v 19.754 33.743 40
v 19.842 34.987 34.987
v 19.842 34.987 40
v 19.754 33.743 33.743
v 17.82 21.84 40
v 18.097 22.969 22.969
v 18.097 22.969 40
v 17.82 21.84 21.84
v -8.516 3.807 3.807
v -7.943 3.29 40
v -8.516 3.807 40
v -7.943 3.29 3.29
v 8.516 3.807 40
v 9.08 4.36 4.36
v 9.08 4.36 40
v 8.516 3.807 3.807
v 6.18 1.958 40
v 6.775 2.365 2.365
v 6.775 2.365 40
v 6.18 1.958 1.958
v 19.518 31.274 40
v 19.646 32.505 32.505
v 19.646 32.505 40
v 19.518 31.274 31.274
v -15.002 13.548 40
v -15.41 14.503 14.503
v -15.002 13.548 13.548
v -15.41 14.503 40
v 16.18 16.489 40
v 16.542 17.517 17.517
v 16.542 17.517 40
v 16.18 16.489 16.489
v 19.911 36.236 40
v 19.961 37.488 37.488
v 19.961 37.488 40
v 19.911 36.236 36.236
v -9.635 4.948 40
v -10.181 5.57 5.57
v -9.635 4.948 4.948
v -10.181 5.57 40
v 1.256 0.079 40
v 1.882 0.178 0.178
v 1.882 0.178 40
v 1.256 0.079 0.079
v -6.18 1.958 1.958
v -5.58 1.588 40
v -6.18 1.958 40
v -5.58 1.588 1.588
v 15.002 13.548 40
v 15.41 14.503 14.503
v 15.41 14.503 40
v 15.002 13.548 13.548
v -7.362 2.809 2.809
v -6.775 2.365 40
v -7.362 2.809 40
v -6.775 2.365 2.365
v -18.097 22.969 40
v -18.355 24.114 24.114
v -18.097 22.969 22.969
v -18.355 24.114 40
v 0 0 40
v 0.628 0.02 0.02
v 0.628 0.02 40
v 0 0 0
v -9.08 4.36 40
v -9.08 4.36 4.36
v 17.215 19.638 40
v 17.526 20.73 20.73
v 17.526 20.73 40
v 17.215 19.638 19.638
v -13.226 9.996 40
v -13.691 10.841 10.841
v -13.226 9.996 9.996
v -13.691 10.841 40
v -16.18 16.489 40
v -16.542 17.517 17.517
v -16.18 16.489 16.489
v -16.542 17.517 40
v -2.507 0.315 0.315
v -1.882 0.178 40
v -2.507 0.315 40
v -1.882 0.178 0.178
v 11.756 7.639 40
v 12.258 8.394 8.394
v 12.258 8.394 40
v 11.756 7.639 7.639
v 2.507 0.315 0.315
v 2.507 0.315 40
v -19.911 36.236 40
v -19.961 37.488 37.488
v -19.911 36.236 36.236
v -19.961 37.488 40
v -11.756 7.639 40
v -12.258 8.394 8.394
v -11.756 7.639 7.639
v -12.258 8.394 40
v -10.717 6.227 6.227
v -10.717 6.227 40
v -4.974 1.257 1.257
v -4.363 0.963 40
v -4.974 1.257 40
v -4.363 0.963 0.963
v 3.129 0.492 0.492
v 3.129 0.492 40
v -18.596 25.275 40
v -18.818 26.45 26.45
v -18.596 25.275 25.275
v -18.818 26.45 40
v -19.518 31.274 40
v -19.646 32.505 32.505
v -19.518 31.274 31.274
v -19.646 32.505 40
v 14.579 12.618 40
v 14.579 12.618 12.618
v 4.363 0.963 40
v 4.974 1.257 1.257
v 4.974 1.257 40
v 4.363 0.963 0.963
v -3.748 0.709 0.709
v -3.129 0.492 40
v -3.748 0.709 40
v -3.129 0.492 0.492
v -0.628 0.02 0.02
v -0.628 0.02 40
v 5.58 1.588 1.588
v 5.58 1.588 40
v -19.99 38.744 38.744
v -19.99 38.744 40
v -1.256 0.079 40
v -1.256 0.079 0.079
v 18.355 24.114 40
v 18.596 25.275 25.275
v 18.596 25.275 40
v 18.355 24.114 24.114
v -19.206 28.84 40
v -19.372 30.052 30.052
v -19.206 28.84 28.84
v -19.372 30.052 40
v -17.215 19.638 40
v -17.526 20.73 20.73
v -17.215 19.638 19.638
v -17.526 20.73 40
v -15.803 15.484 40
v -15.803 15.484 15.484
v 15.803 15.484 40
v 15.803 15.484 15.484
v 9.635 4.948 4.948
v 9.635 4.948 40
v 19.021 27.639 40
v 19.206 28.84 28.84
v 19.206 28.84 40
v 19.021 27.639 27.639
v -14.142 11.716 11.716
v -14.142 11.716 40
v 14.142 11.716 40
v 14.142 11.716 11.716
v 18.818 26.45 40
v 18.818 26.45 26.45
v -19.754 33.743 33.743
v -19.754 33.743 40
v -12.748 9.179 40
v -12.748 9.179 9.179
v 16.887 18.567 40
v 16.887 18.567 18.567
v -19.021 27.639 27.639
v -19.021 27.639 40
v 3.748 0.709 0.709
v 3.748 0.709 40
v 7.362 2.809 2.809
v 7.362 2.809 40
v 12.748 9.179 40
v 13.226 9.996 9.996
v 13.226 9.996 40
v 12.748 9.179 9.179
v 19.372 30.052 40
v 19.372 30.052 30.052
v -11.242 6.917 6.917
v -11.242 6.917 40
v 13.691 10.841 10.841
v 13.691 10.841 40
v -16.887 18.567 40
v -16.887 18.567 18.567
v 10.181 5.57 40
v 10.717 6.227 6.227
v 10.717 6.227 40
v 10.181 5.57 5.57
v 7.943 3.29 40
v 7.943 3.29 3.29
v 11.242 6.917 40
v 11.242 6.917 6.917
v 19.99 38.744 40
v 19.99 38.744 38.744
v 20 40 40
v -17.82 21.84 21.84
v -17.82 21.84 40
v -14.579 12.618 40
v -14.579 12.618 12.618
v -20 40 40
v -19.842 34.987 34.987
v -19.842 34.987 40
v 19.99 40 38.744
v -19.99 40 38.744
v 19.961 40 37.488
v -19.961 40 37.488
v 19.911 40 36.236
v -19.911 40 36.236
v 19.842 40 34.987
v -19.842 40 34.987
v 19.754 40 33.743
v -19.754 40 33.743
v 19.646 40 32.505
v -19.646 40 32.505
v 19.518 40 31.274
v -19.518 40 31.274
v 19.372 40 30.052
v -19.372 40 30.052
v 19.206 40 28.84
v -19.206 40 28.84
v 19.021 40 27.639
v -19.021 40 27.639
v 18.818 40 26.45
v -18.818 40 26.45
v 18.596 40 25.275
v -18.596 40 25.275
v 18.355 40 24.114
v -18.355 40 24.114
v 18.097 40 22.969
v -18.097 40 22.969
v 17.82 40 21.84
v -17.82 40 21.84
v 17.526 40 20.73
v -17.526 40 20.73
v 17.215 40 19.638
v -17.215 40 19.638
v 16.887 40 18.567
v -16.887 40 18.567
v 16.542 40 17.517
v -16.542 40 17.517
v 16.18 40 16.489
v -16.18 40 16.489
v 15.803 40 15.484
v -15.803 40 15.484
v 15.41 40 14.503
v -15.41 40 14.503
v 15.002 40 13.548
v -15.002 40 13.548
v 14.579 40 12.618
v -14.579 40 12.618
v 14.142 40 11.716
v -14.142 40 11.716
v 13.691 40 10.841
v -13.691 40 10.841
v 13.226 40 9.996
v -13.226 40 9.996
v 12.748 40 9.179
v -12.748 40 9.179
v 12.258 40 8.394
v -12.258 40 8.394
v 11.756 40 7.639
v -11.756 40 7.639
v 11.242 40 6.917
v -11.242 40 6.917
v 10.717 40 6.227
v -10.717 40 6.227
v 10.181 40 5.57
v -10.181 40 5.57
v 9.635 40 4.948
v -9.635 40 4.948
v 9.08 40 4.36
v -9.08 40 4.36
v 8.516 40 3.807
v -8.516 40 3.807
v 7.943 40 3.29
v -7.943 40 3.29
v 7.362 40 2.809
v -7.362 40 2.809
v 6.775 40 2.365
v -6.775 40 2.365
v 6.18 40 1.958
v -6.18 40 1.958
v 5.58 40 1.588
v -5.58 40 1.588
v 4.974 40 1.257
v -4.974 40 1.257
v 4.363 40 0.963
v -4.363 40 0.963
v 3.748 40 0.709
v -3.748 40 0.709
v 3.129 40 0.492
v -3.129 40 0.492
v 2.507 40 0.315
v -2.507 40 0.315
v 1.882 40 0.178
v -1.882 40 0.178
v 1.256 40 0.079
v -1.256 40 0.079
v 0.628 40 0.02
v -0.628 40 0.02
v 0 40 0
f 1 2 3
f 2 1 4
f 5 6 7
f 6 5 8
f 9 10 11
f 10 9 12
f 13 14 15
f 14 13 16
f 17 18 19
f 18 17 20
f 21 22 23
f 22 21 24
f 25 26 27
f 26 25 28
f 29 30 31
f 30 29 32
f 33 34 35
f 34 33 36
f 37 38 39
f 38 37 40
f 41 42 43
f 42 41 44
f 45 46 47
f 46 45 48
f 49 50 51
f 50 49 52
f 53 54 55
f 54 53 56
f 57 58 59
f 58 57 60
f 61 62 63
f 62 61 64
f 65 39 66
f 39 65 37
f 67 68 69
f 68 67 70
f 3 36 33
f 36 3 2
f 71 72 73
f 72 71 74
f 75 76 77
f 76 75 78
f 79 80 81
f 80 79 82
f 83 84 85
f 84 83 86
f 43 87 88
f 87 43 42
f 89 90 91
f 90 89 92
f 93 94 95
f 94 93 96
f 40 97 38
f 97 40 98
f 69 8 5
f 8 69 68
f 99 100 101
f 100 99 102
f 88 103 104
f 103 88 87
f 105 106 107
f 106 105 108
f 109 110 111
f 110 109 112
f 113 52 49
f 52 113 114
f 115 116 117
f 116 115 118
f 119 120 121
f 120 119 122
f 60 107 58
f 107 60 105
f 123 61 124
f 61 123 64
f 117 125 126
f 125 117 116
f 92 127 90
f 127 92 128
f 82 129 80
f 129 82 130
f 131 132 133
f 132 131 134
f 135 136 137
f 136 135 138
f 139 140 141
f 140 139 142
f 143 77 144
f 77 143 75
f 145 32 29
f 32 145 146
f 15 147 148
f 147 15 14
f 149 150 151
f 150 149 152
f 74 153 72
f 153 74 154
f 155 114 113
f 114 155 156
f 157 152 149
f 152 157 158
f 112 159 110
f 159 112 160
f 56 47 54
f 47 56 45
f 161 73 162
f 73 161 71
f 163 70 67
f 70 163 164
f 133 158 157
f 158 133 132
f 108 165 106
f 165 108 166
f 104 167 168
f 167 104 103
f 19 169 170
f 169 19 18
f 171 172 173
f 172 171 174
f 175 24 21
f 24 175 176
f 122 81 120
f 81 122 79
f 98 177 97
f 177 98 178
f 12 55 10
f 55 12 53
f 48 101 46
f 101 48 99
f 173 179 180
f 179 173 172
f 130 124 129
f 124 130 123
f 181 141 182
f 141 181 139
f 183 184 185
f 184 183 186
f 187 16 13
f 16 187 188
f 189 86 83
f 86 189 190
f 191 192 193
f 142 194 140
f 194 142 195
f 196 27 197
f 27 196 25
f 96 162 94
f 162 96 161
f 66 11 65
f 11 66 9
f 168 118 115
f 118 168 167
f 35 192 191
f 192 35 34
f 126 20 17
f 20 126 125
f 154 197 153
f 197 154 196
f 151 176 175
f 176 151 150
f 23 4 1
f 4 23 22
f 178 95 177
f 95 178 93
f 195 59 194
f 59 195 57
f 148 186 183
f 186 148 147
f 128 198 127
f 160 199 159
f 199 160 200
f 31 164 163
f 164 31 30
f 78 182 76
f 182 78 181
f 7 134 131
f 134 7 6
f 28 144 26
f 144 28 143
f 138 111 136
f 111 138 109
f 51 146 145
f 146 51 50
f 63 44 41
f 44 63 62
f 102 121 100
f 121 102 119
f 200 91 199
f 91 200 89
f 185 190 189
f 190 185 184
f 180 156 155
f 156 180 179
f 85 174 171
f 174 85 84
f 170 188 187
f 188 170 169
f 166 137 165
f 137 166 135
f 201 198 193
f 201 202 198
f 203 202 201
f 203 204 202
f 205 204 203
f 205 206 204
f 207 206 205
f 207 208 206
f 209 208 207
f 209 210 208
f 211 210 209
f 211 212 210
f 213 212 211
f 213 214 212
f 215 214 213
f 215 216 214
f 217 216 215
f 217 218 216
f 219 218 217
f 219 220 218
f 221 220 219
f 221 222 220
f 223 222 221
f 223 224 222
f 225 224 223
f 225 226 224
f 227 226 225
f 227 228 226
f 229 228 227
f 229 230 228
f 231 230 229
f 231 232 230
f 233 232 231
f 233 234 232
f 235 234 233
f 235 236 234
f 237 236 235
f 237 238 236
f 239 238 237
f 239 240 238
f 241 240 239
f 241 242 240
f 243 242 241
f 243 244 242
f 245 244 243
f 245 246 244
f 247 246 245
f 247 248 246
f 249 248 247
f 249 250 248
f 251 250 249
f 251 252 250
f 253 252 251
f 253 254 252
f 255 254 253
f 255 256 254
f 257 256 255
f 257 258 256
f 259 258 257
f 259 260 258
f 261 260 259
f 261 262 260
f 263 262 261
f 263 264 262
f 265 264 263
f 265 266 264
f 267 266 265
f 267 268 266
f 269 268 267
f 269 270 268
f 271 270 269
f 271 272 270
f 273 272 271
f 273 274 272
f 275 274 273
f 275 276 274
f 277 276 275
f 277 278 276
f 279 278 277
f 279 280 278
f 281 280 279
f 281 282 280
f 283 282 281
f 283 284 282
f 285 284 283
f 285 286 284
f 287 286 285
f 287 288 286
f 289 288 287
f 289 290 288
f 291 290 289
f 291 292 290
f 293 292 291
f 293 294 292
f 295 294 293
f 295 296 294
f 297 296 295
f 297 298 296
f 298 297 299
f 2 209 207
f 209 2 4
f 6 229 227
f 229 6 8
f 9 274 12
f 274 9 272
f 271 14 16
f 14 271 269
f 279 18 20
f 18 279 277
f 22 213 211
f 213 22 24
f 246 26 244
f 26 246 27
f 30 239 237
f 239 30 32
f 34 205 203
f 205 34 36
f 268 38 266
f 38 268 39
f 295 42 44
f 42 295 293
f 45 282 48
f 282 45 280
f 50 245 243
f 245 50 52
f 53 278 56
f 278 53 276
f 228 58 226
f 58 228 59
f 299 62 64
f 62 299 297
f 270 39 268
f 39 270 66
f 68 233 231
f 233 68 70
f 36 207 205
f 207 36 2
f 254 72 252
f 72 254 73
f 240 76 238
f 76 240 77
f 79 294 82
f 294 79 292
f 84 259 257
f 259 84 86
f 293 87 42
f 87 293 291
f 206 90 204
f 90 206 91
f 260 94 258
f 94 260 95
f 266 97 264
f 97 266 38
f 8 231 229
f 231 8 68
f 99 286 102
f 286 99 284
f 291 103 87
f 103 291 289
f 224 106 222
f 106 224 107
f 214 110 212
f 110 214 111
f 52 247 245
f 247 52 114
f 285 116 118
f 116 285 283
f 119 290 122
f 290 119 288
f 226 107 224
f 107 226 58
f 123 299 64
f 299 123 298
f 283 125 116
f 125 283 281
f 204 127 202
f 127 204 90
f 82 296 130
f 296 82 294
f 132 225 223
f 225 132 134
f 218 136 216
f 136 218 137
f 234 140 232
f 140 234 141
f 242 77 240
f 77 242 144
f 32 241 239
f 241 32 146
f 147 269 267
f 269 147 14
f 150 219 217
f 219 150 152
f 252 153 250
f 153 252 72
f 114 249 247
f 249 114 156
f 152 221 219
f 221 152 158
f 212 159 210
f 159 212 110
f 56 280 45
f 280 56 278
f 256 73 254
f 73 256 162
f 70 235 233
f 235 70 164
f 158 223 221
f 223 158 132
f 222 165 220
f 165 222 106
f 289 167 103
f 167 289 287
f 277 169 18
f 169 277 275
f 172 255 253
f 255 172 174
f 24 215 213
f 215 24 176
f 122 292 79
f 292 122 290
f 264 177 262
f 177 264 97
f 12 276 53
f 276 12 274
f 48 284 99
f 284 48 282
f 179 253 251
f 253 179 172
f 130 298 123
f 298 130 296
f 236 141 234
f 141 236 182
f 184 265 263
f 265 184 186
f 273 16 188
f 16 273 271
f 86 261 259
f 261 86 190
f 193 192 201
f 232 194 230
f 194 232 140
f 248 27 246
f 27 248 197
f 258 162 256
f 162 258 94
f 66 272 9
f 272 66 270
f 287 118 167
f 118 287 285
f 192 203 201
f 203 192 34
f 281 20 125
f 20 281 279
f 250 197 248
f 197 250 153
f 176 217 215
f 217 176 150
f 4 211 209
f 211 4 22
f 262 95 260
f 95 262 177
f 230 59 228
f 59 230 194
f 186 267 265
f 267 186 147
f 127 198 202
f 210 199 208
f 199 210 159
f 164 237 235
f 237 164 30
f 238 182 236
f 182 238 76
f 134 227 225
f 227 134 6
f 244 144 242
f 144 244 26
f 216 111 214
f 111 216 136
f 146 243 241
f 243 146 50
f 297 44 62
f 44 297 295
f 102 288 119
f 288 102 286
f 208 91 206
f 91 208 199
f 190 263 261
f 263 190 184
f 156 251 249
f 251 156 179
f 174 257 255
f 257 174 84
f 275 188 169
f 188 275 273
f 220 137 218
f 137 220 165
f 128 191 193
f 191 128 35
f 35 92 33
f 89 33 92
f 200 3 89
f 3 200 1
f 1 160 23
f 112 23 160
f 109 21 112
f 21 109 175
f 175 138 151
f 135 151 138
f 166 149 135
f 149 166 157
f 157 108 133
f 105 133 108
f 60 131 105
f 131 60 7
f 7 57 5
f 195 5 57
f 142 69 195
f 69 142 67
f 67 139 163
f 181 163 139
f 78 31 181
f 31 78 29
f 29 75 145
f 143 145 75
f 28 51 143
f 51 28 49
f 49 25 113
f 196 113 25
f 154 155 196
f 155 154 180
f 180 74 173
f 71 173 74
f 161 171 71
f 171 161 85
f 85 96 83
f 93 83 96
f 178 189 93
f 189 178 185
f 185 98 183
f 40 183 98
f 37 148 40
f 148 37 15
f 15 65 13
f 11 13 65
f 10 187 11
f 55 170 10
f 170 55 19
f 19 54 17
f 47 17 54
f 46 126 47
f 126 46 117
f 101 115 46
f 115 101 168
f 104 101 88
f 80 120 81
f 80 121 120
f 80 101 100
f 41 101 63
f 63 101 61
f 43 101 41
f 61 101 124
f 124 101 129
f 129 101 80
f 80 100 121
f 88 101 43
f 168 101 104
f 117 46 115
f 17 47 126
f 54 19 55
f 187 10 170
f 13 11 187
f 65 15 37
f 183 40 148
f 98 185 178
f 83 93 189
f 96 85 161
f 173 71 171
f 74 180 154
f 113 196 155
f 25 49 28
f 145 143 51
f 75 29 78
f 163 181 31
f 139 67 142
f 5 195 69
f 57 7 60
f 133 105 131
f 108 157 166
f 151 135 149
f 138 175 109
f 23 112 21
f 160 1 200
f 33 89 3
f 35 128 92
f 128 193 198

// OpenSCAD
intersection(){
     translate([0,40,0]){     
         difference(){
            union(){
               linear_extrude(center=false,  $fn=200)
               scale([1,2])circle(r=20); 
               translate([-40,0,0]){
                   cube([80,80,100]); } }
            intersection(){
               linear_extrude(center=false,  $fn=200)
               scale([1,2])circle(r=20); 
               translate([-20,0,0]){
                  cube([80,80,100]); } 
         }
            translate([-40,0,0]){
               cube([80,80,100]); }}}  
             
               
      translate([0,100,40]){        
          rotate([90,0,0]){
              difference(){
            union(){
               linear_extrude(center=false,  $fn=200)
               scale([1,2])circle(r=20); 
               translate([-40,0,0]){
                   cube([80,80,100]); } }
            intersection(){
               linear_extrude(center=false,  $fn=200)
               scale([1,2])circle(r=20); 
               translate([-20,0,0]){
                  cube([80,80,100]); } 
         }
            translate([-40,0,0]){
               cube([80,80,100]); }; }     
         
         }}}
         
       
       
    
         
            
     
     
    
        
